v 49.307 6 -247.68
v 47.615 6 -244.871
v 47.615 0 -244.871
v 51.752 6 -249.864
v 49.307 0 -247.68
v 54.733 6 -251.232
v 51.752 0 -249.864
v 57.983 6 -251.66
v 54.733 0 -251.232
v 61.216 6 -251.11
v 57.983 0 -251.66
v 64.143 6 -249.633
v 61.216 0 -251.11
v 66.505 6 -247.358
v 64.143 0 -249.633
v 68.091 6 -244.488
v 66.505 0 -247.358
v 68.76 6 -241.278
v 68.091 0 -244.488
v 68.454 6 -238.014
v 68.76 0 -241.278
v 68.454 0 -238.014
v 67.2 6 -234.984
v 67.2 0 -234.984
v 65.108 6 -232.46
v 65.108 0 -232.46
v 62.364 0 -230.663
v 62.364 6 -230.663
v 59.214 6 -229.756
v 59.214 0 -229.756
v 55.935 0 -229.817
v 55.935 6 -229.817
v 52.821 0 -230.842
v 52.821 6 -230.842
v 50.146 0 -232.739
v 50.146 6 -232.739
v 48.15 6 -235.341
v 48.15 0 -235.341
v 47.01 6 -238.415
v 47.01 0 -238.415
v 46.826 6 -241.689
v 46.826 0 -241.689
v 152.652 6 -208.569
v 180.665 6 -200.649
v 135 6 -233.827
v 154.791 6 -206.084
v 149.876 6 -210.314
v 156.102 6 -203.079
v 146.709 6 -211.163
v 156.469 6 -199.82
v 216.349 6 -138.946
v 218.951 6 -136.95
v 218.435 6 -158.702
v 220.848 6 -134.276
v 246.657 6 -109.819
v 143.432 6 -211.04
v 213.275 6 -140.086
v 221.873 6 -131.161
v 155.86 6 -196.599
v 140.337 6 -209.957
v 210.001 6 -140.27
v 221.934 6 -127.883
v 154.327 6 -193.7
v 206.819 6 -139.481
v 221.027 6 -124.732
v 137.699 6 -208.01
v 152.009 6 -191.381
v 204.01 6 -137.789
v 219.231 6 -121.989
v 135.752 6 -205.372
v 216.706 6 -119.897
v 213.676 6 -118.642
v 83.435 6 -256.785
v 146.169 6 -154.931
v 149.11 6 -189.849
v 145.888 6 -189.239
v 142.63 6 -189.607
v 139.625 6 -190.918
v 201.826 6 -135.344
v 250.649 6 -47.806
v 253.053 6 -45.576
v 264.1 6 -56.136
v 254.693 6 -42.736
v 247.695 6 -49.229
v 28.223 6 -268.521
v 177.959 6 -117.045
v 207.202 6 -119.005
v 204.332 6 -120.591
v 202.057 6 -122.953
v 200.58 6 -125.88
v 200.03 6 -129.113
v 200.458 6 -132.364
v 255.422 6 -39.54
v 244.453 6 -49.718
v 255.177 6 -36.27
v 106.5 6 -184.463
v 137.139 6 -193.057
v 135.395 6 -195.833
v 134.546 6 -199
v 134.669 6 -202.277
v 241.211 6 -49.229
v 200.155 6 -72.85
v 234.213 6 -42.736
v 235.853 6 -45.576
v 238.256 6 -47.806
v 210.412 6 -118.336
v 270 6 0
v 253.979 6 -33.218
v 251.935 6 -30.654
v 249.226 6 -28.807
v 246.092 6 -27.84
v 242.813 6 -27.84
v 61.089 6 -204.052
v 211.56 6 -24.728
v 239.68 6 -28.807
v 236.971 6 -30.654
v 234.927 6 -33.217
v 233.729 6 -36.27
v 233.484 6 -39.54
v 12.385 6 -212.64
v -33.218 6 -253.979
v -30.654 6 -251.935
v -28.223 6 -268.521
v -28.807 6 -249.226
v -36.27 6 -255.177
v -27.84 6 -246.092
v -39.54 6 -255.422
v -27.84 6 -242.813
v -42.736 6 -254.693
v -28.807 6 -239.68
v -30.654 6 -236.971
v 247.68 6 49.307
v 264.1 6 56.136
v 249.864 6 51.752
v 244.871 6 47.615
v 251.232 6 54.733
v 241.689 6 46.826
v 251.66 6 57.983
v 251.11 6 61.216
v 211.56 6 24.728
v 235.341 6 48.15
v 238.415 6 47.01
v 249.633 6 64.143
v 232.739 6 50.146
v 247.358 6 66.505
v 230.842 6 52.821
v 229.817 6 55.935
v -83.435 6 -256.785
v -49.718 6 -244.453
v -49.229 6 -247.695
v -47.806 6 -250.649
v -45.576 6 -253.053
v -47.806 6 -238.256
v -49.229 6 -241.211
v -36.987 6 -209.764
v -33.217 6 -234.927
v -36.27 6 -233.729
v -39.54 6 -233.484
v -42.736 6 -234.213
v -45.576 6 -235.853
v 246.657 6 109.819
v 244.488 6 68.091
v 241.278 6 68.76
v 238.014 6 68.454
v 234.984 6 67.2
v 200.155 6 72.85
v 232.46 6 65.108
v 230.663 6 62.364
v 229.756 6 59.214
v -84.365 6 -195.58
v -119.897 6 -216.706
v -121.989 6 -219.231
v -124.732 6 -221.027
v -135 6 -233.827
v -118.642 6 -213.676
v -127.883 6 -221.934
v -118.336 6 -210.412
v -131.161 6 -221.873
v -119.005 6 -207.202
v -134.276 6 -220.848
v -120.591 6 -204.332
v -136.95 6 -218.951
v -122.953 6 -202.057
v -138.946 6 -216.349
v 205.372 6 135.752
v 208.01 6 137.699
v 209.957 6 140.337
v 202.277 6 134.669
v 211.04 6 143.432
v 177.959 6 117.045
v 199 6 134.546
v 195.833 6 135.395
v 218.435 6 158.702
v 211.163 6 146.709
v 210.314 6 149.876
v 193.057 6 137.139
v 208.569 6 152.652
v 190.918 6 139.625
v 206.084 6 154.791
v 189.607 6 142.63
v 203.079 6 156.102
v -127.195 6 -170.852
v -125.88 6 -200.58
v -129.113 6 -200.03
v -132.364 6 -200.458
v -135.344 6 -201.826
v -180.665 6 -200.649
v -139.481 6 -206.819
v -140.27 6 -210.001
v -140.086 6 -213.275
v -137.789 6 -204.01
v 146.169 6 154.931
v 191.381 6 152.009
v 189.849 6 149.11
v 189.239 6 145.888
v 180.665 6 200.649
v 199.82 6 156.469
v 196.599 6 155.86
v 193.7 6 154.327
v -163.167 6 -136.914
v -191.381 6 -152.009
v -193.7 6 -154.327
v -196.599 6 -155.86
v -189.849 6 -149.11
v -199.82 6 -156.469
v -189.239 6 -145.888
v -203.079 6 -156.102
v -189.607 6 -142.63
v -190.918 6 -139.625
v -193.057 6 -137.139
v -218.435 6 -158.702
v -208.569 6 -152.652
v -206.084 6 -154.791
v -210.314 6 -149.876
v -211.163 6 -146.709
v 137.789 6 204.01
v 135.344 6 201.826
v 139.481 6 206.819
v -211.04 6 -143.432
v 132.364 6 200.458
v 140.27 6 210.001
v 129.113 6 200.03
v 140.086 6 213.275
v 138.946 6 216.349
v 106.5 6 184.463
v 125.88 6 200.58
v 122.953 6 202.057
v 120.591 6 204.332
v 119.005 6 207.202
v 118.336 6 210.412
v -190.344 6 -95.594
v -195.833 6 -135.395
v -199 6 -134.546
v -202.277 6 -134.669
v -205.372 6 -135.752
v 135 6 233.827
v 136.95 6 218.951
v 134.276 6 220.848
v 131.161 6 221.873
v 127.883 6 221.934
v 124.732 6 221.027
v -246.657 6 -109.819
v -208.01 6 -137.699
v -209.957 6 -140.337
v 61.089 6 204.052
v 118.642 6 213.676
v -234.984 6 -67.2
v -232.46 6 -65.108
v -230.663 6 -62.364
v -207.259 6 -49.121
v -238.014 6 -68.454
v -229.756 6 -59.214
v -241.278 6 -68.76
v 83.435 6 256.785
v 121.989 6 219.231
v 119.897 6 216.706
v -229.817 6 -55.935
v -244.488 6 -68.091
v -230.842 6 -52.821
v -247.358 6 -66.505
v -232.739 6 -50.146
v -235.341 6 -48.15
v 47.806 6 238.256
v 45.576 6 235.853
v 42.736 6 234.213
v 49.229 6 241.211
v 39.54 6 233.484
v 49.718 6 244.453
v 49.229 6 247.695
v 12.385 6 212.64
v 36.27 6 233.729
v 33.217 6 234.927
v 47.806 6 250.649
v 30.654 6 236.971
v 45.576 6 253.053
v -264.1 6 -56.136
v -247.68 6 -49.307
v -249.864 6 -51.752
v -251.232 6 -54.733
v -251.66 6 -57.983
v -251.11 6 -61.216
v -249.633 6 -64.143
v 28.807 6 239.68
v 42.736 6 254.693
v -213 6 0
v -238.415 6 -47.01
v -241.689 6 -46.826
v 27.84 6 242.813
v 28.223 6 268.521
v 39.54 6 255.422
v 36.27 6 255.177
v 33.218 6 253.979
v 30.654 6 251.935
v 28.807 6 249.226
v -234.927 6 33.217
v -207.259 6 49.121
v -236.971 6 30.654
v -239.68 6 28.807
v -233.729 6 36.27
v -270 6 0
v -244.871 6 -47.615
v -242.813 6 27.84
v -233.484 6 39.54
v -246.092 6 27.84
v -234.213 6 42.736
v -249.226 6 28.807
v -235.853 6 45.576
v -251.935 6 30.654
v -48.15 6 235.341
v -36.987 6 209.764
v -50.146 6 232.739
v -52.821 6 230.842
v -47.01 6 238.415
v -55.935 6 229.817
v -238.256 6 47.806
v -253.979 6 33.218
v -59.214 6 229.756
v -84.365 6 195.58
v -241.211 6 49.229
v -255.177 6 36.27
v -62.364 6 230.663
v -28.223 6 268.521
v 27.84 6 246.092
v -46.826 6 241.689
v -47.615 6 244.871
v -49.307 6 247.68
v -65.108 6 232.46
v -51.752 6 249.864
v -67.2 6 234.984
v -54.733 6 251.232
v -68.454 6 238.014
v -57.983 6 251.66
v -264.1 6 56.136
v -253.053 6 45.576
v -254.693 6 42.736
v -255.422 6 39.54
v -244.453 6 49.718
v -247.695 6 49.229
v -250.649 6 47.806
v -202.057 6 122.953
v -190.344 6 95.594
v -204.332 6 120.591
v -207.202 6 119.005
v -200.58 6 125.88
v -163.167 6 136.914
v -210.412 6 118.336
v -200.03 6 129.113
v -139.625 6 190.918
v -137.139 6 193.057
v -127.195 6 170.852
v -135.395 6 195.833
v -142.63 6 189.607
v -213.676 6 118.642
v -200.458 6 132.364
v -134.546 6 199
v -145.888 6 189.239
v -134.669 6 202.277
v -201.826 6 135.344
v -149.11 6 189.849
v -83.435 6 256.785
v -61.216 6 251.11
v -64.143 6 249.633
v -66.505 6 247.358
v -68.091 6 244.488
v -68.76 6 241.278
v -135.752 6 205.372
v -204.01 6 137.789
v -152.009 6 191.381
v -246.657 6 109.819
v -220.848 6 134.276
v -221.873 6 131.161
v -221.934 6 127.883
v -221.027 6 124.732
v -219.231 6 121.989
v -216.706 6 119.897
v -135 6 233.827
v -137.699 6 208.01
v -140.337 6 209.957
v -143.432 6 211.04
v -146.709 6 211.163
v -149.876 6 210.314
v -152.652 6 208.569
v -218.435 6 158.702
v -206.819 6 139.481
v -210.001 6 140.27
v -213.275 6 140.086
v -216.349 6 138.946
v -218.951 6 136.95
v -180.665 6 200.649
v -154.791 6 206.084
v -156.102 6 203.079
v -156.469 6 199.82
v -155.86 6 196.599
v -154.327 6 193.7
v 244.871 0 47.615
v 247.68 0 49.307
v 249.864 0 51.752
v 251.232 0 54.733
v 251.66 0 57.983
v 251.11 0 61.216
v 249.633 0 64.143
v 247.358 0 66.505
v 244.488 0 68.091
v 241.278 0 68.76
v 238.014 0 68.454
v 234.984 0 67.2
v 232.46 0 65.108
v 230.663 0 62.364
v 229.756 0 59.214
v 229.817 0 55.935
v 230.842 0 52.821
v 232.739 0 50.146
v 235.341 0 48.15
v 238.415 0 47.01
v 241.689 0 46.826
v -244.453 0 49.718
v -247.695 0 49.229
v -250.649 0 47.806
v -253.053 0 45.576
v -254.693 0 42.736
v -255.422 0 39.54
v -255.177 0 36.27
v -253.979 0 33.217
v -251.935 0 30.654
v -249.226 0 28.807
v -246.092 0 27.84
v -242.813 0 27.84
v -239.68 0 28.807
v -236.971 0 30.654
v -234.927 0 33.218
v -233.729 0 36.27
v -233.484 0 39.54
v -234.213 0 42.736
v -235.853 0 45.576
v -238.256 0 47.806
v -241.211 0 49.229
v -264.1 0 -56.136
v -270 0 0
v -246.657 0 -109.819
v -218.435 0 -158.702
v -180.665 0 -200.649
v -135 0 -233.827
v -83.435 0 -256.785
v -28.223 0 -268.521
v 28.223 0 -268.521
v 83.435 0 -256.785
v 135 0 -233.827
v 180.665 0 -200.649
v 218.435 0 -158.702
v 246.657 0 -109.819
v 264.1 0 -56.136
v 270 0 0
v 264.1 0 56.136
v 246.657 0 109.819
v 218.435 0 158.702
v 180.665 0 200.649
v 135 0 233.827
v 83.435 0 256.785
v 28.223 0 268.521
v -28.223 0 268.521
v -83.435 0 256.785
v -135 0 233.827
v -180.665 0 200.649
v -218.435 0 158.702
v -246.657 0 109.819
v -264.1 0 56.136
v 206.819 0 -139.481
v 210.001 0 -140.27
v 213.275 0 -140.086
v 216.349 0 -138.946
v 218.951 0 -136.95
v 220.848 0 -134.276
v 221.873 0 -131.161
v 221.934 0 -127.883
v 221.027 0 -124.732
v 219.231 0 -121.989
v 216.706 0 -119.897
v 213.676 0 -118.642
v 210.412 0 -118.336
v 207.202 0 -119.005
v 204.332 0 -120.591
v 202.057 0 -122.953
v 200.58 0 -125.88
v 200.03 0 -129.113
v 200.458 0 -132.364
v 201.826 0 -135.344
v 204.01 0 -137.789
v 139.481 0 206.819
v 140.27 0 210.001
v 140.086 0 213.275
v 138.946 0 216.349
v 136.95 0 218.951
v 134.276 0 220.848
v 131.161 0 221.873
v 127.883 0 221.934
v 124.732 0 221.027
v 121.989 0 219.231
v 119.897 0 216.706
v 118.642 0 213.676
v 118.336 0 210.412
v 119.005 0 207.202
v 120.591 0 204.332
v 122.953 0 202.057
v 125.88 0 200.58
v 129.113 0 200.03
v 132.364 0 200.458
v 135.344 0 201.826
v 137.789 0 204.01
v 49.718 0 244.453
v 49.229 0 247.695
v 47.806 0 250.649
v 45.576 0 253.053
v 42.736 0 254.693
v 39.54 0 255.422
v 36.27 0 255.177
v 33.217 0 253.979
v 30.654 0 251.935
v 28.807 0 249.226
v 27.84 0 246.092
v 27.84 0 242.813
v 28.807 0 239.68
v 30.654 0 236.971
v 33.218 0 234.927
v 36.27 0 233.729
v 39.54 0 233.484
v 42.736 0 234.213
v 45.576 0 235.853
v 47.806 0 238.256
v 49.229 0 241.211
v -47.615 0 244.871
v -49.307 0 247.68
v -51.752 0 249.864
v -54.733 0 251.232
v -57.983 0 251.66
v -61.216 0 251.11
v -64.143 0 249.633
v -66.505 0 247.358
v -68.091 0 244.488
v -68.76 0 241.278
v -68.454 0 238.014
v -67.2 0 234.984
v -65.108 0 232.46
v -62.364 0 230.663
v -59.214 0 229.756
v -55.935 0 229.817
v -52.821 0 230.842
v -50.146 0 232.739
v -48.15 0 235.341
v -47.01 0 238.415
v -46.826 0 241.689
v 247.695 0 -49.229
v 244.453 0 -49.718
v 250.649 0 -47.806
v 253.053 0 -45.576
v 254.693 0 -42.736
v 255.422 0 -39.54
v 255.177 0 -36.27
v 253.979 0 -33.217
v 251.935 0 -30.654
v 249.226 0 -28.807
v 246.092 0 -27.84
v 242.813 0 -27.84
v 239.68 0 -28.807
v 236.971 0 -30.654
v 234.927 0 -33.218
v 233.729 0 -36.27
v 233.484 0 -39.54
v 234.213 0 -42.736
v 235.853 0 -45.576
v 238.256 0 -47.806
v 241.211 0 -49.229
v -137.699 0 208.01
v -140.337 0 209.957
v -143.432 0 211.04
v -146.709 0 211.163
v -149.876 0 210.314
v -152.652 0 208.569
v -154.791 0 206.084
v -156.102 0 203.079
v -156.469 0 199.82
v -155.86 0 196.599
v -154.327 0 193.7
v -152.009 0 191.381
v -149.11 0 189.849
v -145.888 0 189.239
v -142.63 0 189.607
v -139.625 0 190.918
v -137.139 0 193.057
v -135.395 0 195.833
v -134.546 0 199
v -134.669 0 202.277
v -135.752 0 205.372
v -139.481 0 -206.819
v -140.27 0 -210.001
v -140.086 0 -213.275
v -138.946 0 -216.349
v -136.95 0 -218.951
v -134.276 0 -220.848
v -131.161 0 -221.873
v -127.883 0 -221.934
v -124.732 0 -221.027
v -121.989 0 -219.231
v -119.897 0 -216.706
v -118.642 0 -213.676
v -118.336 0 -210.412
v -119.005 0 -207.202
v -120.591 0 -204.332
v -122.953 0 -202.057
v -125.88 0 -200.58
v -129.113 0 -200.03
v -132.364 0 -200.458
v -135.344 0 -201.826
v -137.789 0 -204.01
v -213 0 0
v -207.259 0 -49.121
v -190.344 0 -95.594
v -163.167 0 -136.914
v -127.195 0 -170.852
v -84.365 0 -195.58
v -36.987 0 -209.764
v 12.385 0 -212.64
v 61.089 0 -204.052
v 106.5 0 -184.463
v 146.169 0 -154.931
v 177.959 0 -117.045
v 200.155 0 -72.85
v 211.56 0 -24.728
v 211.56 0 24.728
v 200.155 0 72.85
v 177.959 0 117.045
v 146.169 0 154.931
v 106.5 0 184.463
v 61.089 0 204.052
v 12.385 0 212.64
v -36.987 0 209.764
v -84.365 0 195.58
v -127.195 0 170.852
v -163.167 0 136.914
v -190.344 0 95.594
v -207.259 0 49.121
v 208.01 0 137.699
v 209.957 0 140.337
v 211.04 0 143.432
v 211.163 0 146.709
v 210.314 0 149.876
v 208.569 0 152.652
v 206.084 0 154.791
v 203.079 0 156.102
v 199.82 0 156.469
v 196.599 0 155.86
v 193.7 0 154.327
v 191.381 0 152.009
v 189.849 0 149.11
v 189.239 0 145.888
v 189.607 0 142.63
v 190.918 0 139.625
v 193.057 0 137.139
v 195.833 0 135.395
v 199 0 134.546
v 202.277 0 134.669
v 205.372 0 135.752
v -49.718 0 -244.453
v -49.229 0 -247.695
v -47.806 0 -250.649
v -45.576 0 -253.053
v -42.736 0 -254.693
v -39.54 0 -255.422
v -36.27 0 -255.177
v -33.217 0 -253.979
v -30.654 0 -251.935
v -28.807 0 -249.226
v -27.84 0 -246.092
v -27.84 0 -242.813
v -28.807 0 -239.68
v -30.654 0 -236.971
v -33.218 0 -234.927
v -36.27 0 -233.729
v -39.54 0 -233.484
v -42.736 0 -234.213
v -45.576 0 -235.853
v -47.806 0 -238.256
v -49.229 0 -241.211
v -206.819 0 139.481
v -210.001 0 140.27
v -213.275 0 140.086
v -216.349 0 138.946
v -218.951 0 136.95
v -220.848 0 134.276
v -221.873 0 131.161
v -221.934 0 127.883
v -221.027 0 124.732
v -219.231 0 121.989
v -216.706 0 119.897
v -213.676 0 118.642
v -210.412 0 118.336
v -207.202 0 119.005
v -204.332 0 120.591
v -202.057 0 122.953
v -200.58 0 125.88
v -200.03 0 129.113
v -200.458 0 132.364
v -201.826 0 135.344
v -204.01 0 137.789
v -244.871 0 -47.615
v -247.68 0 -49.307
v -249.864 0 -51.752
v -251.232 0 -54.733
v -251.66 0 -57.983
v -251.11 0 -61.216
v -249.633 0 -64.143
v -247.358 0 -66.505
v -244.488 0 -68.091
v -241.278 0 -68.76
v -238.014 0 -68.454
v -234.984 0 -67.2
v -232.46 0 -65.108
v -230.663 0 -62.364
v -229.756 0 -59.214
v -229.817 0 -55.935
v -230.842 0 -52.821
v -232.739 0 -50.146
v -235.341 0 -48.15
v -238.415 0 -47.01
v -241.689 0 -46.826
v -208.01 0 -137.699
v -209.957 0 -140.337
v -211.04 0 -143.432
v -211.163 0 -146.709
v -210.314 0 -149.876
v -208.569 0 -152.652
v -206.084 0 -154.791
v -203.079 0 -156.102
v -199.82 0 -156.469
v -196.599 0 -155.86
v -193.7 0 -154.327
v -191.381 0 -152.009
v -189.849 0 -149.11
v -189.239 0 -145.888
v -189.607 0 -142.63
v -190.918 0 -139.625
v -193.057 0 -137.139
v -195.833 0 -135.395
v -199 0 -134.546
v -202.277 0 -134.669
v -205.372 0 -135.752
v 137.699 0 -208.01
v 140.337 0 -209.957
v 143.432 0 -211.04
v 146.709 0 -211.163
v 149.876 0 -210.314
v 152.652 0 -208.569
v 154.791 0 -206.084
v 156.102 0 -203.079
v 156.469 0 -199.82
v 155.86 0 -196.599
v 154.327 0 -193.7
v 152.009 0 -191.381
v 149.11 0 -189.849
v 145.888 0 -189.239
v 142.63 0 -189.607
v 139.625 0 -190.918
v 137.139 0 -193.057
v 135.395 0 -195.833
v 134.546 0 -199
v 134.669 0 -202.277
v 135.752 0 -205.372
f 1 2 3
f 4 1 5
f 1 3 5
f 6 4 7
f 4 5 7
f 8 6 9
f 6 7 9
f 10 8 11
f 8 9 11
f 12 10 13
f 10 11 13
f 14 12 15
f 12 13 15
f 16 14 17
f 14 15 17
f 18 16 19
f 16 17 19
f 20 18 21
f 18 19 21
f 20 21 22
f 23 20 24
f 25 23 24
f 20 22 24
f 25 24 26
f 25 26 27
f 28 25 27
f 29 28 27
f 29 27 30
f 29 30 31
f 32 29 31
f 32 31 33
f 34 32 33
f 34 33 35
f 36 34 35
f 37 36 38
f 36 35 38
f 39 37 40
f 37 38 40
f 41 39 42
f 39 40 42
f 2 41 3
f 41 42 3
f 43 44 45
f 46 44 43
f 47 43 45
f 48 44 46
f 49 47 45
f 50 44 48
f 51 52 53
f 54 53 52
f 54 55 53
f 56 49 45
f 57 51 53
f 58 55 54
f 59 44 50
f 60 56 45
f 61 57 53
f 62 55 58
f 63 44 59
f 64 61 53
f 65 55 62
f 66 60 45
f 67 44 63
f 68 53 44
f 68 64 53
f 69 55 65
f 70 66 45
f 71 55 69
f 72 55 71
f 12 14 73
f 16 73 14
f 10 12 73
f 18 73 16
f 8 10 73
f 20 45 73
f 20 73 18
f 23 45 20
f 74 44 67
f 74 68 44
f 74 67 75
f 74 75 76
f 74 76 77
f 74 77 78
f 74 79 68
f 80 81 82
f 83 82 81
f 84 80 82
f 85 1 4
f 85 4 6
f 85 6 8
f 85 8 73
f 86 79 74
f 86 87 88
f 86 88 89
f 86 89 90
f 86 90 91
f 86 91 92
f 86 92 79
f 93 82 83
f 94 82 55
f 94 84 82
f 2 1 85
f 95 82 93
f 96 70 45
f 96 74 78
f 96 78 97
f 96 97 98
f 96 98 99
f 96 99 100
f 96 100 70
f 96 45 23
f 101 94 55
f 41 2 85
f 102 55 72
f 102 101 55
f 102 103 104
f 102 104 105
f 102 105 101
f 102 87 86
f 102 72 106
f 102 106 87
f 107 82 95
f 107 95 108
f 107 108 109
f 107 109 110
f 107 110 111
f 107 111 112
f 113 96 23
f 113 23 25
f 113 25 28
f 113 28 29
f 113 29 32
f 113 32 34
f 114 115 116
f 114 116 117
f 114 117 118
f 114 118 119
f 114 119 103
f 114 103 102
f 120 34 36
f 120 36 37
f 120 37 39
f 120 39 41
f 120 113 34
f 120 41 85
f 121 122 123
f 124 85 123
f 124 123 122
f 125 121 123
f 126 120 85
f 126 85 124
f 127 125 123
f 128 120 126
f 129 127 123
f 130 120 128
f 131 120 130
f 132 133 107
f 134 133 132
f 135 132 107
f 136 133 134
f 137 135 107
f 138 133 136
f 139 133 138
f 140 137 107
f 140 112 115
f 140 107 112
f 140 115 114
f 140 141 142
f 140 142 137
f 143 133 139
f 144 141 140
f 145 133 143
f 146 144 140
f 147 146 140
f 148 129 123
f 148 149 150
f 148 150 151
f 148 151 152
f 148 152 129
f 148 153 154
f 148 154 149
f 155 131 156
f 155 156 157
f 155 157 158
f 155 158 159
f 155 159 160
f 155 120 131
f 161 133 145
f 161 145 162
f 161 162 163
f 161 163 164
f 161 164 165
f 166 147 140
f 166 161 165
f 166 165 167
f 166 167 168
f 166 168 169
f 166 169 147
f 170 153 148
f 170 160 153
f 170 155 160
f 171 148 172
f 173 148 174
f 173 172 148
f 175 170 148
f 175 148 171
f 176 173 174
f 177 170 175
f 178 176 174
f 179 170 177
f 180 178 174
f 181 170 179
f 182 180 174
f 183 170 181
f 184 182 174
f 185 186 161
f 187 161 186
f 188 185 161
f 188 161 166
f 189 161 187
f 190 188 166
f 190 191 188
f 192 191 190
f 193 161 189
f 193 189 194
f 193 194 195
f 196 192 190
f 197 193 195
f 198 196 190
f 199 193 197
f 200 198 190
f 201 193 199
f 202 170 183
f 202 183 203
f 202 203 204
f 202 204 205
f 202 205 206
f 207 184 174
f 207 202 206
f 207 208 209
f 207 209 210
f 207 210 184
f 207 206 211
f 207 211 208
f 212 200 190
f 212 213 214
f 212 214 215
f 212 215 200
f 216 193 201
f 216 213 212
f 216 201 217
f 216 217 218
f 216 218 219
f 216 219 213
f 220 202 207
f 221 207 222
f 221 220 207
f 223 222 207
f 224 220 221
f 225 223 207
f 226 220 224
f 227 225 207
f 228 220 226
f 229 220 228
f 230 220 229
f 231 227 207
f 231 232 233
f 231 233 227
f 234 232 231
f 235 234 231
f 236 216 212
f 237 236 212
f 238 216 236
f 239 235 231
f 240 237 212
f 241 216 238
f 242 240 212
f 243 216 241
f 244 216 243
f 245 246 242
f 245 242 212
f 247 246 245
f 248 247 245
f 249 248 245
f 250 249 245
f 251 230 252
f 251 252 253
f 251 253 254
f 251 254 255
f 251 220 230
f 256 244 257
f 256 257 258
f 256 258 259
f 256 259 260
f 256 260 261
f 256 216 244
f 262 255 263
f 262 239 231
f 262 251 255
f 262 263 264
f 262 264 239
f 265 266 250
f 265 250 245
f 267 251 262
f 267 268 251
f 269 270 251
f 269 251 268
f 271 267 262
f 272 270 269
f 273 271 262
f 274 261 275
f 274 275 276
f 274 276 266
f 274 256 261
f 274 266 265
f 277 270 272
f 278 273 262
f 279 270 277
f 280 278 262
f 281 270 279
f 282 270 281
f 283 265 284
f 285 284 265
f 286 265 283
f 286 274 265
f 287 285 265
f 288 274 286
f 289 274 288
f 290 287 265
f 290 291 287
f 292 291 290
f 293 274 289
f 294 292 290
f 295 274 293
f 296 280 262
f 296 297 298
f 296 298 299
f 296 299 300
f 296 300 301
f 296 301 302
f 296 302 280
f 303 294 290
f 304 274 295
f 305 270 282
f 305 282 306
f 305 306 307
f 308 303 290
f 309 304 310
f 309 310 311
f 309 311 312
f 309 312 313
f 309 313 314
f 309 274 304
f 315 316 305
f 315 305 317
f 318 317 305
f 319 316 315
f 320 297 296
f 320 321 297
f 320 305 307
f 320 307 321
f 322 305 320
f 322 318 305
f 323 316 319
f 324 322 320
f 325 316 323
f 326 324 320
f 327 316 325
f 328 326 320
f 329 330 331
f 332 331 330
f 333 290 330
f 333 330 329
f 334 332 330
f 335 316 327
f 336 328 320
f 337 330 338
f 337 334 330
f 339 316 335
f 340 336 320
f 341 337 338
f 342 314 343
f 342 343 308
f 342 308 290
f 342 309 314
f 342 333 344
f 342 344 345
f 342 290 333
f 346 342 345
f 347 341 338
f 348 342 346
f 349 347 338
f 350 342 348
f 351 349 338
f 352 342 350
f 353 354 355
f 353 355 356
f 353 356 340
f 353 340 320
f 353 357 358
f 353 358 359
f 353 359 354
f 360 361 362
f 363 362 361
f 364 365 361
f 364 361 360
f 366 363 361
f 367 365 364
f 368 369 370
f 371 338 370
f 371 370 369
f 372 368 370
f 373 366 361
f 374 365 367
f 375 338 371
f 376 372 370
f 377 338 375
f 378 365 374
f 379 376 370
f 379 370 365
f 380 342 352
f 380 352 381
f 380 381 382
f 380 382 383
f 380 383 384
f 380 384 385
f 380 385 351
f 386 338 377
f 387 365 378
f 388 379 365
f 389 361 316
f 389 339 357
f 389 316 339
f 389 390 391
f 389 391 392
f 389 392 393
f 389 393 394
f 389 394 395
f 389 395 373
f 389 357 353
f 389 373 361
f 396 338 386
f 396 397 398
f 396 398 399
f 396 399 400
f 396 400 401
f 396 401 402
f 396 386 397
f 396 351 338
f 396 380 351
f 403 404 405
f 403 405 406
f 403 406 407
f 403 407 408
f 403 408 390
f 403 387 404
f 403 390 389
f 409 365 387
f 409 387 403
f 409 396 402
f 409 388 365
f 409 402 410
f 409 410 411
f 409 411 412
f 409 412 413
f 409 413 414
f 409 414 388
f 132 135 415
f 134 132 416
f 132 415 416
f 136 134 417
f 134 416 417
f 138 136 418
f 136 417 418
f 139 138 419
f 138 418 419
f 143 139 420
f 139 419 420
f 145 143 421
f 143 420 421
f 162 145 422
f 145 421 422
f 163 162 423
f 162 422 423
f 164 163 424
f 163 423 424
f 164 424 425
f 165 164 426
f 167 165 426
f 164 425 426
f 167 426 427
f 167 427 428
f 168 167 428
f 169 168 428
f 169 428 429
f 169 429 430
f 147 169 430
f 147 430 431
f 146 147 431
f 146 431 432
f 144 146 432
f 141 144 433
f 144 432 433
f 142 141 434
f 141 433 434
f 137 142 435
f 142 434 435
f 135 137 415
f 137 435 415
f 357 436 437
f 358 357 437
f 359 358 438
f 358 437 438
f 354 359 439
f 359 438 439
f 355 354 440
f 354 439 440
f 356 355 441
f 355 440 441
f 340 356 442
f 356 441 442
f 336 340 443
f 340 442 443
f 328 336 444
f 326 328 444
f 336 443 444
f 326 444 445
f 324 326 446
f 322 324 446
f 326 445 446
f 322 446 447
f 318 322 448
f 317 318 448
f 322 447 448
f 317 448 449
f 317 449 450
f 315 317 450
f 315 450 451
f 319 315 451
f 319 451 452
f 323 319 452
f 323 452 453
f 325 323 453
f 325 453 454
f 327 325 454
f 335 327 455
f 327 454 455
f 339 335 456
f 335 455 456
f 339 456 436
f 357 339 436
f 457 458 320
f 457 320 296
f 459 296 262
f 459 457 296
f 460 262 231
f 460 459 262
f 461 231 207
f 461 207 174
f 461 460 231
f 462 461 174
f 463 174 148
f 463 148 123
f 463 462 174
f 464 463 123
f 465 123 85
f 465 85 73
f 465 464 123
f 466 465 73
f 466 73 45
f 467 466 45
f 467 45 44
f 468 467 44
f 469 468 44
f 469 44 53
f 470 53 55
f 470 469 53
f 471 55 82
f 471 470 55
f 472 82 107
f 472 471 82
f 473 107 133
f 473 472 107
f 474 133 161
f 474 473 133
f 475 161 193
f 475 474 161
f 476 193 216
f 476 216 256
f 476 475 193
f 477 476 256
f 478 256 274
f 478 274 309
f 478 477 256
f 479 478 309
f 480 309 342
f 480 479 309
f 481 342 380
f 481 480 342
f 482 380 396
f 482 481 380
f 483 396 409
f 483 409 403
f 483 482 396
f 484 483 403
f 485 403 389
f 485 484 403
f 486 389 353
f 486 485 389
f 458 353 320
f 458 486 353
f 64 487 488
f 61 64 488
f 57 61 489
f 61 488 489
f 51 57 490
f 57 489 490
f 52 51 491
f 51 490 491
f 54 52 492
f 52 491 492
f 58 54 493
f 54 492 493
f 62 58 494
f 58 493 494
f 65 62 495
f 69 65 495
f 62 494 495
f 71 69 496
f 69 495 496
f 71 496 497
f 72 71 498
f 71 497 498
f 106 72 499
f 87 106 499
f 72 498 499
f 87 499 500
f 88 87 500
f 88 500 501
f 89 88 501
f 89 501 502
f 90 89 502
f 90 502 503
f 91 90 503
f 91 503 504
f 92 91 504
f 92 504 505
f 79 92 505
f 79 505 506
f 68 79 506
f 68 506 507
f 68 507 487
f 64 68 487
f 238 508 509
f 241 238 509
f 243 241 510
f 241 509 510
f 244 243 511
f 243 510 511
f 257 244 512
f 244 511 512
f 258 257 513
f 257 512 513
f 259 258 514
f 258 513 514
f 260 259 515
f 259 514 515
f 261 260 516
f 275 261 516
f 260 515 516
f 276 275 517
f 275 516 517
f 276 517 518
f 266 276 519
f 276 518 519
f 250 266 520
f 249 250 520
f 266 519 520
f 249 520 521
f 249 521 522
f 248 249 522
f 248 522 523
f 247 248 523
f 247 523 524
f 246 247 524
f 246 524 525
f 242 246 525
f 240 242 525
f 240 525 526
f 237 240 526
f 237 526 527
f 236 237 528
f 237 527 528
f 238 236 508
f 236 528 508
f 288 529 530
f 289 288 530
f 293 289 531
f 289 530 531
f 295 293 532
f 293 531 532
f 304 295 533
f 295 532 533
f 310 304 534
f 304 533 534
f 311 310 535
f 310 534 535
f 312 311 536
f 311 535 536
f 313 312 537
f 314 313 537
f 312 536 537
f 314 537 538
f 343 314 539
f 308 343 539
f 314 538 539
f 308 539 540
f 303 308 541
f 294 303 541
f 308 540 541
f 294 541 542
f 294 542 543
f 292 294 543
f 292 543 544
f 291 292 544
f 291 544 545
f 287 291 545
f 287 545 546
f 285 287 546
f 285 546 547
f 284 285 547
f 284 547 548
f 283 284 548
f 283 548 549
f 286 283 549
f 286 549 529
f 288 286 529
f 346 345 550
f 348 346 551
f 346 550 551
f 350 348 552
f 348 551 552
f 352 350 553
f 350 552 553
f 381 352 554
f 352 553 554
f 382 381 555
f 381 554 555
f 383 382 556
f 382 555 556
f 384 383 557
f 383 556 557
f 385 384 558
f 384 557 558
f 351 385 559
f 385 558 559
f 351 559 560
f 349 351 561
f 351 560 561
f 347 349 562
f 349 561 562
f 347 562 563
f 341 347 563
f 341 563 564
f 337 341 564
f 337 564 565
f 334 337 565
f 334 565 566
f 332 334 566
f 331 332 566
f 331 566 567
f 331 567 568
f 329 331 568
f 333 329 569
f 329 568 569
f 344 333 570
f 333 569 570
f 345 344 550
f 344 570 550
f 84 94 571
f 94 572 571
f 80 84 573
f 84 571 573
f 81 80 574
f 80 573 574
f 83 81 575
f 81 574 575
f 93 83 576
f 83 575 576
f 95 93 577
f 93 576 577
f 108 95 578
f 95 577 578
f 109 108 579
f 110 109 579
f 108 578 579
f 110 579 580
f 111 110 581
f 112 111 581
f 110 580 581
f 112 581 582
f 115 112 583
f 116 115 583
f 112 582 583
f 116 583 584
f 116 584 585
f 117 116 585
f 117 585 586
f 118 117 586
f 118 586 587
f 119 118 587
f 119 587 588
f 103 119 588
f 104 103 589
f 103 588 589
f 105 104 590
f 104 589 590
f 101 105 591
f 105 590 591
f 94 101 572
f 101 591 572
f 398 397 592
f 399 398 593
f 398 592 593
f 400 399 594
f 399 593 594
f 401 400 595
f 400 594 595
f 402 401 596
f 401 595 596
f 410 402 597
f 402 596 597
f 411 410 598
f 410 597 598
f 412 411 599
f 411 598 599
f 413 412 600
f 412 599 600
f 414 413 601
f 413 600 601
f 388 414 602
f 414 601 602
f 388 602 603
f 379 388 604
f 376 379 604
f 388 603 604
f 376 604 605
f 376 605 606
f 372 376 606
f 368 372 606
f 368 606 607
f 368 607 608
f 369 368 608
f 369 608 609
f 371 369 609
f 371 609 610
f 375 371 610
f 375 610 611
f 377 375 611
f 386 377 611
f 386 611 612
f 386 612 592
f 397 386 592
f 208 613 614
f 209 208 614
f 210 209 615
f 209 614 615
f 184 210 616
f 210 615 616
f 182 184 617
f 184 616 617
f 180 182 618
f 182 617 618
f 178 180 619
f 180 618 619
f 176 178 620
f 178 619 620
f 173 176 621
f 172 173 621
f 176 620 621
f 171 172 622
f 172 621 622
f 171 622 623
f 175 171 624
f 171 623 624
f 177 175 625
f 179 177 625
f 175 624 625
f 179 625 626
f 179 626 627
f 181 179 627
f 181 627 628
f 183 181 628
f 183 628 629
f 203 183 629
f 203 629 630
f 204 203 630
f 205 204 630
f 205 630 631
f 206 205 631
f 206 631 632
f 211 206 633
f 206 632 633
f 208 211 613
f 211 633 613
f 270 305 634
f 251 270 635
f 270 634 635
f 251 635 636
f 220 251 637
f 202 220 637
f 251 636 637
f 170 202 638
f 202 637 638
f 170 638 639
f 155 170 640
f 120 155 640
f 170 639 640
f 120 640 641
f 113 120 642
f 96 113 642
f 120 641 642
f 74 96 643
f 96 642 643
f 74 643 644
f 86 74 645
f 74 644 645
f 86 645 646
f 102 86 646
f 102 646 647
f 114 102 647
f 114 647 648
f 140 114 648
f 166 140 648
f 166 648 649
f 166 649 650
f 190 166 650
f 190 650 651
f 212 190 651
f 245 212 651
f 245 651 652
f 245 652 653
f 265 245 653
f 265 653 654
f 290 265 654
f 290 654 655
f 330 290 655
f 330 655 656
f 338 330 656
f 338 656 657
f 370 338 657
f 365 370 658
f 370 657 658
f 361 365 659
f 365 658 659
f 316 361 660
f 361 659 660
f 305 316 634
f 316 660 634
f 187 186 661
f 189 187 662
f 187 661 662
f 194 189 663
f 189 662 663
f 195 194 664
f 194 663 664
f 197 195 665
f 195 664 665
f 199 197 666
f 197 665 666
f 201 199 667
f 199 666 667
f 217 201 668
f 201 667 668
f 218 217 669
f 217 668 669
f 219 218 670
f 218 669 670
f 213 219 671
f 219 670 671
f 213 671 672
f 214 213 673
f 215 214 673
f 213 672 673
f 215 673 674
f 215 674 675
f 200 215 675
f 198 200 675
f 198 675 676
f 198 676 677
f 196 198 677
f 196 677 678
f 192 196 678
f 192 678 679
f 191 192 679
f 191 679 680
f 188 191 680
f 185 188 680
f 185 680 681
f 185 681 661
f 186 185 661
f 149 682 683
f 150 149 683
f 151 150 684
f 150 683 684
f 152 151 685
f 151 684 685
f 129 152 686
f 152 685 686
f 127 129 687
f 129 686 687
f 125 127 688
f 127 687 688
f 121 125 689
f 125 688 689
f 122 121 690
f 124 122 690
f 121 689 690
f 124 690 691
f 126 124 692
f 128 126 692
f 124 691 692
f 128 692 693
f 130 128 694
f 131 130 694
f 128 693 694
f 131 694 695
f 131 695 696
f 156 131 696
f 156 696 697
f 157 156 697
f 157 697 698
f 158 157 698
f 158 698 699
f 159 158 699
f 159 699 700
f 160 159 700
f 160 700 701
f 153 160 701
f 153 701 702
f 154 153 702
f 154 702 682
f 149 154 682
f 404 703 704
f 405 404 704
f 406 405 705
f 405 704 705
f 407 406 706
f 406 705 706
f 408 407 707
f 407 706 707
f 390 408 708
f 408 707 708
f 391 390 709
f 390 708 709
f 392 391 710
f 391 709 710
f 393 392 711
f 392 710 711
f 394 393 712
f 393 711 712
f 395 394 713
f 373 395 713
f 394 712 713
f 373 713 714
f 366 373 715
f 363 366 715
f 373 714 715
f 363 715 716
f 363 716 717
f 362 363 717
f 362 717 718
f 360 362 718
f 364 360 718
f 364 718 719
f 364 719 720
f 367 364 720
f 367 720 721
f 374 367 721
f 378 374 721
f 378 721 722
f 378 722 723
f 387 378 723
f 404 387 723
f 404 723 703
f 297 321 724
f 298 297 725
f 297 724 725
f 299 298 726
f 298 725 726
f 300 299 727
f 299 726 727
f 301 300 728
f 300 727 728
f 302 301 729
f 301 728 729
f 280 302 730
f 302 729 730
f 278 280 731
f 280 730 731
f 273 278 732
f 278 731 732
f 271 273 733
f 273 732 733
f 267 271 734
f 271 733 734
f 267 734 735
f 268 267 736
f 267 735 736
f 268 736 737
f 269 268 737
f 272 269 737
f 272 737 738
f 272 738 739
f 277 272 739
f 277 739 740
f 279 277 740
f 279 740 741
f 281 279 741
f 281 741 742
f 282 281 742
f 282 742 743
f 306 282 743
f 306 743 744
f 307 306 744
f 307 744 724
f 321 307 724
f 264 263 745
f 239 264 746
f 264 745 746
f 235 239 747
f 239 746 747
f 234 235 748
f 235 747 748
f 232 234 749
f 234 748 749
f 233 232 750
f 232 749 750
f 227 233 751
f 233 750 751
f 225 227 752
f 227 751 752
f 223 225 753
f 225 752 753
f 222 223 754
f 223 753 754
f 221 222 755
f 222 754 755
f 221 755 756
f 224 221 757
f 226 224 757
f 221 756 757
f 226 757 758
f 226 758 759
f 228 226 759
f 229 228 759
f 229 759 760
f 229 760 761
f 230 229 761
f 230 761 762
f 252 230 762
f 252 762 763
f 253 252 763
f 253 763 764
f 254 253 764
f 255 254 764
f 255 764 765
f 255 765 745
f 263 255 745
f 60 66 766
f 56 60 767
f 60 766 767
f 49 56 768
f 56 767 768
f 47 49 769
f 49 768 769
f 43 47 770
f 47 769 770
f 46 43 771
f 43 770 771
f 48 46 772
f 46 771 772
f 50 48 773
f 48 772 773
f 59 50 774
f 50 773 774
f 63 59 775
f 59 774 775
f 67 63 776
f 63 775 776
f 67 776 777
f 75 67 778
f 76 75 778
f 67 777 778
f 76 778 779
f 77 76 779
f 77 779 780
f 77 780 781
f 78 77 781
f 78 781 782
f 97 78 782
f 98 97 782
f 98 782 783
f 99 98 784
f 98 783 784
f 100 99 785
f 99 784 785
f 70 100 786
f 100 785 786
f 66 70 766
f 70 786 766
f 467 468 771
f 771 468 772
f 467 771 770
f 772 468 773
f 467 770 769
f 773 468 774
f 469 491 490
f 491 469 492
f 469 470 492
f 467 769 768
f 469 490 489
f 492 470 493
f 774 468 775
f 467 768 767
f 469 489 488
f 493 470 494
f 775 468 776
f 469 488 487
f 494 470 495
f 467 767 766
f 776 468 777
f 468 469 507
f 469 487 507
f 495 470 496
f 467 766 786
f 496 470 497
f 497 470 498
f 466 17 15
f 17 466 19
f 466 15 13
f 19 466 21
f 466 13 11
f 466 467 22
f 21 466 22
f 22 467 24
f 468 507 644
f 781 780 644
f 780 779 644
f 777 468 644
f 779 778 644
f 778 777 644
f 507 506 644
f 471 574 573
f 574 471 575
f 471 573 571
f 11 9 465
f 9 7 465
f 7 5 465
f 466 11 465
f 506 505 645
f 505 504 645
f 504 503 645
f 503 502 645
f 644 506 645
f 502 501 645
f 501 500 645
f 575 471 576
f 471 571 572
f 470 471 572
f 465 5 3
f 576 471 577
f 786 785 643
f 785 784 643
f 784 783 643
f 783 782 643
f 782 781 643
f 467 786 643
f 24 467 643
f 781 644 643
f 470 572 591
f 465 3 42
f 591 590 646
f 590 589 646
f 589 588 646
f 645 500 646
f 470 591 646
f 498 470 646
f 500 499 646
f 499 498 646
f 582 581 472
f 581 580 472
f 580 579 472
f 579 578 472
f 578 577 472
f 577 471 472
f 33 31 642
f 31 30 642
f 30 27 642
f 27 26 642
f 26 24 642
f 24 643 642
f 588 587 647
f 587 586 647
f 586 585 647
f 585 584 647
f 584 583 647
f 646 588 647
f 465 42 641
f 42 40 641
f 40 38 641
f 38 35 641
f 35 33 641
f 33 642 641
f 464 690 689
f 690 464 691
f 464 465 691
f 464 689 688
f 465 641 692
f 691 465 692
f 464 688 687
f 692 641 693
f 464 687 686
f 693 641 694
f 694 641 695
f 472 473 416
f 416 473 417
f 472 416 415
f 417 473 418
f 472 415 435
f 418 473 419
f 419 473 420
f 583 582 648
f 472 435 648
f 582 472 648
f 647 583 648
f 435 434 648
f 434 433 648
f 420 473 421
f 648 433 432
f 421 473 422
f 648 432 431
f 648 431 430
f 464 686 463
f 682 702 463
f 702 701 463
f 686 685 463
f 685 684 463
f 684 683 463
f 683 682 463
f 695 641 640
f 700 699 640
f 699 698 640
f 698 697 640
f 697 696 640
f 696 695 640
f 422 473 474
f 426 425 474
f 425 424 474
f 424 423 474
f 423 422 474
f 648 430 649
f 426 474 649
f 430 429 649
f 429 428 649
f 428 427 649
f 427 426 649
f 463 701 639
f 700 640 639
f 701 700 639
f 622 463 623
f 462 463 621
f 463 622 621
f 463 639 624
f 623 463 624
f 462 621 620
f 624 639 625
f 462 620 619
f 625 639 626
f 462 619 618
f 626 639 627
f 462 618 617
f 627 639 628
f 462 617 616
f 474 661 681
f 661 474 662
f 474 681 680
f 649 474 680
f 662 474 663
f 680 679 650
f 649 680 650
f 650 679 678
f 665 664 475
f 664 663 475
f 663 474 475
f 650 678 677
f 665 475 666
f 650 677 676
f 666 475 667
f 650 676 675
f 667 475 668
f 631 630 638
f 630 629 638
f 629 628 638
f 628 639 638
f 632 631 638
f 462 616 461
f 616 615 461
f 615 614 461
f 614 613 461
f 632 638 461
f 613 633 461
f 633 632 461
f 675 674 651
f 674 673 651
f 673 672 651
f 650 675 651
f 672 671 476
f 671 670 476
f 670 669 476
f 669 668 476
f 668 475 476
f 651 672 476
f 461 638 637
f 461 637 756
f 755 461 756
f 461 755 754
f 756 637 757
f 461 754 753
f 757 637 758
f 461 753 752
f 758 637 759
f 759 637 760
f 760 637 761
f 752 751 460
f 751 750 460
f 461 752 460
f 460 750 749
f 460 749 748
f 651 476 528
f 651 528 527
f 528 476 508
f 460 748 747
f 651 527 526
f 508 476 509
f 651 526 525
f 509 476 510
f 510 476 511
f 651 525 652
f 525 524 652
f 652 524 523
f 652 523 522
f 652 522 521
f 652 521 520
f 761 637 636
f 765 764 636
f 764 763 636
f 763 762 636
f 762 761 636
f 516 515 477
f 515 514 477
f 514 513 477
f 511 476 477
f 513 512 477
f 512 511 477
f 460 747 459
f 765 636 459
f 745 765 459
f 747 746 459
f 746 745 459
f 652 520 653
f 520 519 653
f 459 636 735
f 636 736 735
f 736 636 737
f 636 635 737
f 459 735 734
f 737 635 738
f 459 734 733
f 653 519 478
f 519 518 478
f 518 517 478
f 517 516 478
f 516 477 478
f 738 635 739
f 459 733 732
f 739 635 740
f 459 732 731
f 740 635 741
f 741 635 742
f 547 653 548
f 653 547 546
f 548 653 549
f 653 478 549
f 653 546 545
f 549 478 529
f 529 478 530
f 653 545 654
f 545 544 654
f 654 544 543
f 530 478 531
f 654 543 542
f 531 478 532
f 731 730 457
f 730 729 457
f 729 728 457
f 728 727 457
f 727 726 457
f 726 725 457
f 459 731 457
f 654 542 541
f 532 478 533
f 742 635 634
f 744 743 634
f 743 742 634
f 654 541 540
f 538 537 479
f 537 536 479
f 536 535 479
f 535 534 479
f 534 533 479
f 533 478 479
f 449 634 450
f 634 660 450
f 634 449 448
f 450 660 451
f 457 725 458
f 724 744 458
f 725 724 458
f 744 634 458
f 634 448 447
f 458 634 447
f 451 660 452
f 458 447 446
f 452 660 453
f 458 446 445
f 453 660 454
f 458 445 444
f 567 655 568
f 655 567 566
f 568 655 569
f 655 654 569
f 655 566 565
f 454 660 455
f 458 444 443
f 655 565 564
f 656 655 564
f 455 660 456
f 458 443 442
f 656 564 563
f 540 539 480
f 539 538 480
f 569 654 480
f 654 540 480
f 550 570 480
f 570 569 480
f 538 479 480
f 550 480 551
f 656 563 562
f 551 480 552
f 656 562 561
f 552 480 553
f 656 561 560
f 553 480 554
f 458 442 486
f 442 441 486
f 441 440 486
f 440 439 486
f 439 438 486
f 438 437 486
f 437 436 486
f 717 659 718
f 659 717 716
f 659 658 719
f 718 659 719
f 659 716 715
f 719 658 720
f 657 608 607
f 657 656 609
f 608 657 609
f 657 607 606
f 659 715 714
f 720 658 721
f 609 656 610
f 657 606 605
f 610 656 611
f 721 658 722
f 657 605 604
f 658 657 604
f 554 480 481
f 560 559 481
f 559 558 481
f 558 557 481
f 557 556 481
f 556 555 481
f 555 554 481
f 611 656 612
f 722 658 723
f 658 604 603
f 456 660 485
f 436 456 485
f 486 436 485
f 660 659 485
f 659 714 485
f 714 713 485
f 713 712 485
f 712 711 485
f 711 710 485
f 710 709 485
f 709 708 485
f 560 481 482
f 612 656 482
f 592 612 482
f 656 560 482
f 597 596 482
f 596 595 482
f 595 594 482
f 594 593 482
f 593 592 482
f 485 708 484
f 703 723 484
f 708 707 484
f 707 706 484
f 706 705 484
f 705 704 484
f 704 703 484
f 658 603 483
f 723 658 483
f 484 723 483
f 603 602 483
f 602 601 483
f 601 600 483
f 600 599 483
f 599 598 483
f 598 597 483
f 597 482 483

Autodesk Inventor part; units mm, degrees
ref_plane "YZ Plane" through (0, 0, 0) normal (1, 0, 0) x (0, 1, 0)
ref_plane "XZ Plane" through (0, 0, 0) normal (0, 1, 0) x (-1, 0, 0)
ref_plane "XY Plane" through (0, 0, 0) normal (0, 0, 1) x (1, 0, 0)
sketch "Sketch1" plane through (0, 0, 0) normal (0, 1, 0) x (-1, 0, 0)
  circle A0 centre (0, 0) radius 213
  circle A1 centre (0, 0) radius 270
  line L0 (270, 0) -> (213, 0)
  line L1 (-213, 0) -> (-270, 0)
  line L2 (0, 213) -> (0, 270)
  point P0 (241.5, 0)
  point P1 (-241.5, 0)
  point P2 (0, 241.5)
  dimension "d1" = 540
  dimension "d4" = 426
extrude "Extrusion1" add sketch "Sketch1" along normal blind 6 contours L0 A1 L1 A0 | A0 L2 A1 L0 | A0 L1 A1 L2
sketch "Sketch2" plane through (0, 0, 0) normal (0, -1, 0) x (1, 0, 0)
  circle A0 centre (0, 0) radius 270 projected
  circle A1 centre (0, 0) radius 213 projected
  circle A2 centre (38.7175, 244.4529) radius 11
  circle A3 centre (0, 0) radius 213 projected
  line L0 (38.7175, 244.4529) -> (0, 0)
  point P0 (0, 213)
  point P1 (265, 0)
  dimension "d5" = 247.5
  dimension "d7" = 22
extrude "Cut1" cut sketch "Sketch2" against normal blind 6 contours A2
pattern_circular "Circular Pattern1" count 16 over 360 about axis through (0, 0, 0) along (0, 1, 0) of "Cut1"
equation "\"d1\" = Charging_hatch_width"
equation "\"d4\" = Accsess_hatch_diameter"
equation "\"d9\" = Thickness"
equation "\"BendRadius\" = Thickness"
equation "\"BendReliefWidth\" = Thickness"
equation "\"BendReliefDepth\" = 0.5 * Thickness"
equation "\"CornerReliefSize\" = 4 * Thickness"
equation "\"MinimumRemnant\" = 2 * Thickness"
equation "\"TransitionRadius\" = BendRadius"
equation "\"JacobiRadiusSize\" = BendRadius"
equation "\"GapSize\" = Thickness"
equation "\"d8\" = Thickness"
equation "\"Charging_hatch_width\" = 540"
equation "\"Accsess_hatch_diameter\" = 426"
equation "\"Thickness\" = 6"
properties part number "TZS 0903 accses hatch flange" material "Steel"
